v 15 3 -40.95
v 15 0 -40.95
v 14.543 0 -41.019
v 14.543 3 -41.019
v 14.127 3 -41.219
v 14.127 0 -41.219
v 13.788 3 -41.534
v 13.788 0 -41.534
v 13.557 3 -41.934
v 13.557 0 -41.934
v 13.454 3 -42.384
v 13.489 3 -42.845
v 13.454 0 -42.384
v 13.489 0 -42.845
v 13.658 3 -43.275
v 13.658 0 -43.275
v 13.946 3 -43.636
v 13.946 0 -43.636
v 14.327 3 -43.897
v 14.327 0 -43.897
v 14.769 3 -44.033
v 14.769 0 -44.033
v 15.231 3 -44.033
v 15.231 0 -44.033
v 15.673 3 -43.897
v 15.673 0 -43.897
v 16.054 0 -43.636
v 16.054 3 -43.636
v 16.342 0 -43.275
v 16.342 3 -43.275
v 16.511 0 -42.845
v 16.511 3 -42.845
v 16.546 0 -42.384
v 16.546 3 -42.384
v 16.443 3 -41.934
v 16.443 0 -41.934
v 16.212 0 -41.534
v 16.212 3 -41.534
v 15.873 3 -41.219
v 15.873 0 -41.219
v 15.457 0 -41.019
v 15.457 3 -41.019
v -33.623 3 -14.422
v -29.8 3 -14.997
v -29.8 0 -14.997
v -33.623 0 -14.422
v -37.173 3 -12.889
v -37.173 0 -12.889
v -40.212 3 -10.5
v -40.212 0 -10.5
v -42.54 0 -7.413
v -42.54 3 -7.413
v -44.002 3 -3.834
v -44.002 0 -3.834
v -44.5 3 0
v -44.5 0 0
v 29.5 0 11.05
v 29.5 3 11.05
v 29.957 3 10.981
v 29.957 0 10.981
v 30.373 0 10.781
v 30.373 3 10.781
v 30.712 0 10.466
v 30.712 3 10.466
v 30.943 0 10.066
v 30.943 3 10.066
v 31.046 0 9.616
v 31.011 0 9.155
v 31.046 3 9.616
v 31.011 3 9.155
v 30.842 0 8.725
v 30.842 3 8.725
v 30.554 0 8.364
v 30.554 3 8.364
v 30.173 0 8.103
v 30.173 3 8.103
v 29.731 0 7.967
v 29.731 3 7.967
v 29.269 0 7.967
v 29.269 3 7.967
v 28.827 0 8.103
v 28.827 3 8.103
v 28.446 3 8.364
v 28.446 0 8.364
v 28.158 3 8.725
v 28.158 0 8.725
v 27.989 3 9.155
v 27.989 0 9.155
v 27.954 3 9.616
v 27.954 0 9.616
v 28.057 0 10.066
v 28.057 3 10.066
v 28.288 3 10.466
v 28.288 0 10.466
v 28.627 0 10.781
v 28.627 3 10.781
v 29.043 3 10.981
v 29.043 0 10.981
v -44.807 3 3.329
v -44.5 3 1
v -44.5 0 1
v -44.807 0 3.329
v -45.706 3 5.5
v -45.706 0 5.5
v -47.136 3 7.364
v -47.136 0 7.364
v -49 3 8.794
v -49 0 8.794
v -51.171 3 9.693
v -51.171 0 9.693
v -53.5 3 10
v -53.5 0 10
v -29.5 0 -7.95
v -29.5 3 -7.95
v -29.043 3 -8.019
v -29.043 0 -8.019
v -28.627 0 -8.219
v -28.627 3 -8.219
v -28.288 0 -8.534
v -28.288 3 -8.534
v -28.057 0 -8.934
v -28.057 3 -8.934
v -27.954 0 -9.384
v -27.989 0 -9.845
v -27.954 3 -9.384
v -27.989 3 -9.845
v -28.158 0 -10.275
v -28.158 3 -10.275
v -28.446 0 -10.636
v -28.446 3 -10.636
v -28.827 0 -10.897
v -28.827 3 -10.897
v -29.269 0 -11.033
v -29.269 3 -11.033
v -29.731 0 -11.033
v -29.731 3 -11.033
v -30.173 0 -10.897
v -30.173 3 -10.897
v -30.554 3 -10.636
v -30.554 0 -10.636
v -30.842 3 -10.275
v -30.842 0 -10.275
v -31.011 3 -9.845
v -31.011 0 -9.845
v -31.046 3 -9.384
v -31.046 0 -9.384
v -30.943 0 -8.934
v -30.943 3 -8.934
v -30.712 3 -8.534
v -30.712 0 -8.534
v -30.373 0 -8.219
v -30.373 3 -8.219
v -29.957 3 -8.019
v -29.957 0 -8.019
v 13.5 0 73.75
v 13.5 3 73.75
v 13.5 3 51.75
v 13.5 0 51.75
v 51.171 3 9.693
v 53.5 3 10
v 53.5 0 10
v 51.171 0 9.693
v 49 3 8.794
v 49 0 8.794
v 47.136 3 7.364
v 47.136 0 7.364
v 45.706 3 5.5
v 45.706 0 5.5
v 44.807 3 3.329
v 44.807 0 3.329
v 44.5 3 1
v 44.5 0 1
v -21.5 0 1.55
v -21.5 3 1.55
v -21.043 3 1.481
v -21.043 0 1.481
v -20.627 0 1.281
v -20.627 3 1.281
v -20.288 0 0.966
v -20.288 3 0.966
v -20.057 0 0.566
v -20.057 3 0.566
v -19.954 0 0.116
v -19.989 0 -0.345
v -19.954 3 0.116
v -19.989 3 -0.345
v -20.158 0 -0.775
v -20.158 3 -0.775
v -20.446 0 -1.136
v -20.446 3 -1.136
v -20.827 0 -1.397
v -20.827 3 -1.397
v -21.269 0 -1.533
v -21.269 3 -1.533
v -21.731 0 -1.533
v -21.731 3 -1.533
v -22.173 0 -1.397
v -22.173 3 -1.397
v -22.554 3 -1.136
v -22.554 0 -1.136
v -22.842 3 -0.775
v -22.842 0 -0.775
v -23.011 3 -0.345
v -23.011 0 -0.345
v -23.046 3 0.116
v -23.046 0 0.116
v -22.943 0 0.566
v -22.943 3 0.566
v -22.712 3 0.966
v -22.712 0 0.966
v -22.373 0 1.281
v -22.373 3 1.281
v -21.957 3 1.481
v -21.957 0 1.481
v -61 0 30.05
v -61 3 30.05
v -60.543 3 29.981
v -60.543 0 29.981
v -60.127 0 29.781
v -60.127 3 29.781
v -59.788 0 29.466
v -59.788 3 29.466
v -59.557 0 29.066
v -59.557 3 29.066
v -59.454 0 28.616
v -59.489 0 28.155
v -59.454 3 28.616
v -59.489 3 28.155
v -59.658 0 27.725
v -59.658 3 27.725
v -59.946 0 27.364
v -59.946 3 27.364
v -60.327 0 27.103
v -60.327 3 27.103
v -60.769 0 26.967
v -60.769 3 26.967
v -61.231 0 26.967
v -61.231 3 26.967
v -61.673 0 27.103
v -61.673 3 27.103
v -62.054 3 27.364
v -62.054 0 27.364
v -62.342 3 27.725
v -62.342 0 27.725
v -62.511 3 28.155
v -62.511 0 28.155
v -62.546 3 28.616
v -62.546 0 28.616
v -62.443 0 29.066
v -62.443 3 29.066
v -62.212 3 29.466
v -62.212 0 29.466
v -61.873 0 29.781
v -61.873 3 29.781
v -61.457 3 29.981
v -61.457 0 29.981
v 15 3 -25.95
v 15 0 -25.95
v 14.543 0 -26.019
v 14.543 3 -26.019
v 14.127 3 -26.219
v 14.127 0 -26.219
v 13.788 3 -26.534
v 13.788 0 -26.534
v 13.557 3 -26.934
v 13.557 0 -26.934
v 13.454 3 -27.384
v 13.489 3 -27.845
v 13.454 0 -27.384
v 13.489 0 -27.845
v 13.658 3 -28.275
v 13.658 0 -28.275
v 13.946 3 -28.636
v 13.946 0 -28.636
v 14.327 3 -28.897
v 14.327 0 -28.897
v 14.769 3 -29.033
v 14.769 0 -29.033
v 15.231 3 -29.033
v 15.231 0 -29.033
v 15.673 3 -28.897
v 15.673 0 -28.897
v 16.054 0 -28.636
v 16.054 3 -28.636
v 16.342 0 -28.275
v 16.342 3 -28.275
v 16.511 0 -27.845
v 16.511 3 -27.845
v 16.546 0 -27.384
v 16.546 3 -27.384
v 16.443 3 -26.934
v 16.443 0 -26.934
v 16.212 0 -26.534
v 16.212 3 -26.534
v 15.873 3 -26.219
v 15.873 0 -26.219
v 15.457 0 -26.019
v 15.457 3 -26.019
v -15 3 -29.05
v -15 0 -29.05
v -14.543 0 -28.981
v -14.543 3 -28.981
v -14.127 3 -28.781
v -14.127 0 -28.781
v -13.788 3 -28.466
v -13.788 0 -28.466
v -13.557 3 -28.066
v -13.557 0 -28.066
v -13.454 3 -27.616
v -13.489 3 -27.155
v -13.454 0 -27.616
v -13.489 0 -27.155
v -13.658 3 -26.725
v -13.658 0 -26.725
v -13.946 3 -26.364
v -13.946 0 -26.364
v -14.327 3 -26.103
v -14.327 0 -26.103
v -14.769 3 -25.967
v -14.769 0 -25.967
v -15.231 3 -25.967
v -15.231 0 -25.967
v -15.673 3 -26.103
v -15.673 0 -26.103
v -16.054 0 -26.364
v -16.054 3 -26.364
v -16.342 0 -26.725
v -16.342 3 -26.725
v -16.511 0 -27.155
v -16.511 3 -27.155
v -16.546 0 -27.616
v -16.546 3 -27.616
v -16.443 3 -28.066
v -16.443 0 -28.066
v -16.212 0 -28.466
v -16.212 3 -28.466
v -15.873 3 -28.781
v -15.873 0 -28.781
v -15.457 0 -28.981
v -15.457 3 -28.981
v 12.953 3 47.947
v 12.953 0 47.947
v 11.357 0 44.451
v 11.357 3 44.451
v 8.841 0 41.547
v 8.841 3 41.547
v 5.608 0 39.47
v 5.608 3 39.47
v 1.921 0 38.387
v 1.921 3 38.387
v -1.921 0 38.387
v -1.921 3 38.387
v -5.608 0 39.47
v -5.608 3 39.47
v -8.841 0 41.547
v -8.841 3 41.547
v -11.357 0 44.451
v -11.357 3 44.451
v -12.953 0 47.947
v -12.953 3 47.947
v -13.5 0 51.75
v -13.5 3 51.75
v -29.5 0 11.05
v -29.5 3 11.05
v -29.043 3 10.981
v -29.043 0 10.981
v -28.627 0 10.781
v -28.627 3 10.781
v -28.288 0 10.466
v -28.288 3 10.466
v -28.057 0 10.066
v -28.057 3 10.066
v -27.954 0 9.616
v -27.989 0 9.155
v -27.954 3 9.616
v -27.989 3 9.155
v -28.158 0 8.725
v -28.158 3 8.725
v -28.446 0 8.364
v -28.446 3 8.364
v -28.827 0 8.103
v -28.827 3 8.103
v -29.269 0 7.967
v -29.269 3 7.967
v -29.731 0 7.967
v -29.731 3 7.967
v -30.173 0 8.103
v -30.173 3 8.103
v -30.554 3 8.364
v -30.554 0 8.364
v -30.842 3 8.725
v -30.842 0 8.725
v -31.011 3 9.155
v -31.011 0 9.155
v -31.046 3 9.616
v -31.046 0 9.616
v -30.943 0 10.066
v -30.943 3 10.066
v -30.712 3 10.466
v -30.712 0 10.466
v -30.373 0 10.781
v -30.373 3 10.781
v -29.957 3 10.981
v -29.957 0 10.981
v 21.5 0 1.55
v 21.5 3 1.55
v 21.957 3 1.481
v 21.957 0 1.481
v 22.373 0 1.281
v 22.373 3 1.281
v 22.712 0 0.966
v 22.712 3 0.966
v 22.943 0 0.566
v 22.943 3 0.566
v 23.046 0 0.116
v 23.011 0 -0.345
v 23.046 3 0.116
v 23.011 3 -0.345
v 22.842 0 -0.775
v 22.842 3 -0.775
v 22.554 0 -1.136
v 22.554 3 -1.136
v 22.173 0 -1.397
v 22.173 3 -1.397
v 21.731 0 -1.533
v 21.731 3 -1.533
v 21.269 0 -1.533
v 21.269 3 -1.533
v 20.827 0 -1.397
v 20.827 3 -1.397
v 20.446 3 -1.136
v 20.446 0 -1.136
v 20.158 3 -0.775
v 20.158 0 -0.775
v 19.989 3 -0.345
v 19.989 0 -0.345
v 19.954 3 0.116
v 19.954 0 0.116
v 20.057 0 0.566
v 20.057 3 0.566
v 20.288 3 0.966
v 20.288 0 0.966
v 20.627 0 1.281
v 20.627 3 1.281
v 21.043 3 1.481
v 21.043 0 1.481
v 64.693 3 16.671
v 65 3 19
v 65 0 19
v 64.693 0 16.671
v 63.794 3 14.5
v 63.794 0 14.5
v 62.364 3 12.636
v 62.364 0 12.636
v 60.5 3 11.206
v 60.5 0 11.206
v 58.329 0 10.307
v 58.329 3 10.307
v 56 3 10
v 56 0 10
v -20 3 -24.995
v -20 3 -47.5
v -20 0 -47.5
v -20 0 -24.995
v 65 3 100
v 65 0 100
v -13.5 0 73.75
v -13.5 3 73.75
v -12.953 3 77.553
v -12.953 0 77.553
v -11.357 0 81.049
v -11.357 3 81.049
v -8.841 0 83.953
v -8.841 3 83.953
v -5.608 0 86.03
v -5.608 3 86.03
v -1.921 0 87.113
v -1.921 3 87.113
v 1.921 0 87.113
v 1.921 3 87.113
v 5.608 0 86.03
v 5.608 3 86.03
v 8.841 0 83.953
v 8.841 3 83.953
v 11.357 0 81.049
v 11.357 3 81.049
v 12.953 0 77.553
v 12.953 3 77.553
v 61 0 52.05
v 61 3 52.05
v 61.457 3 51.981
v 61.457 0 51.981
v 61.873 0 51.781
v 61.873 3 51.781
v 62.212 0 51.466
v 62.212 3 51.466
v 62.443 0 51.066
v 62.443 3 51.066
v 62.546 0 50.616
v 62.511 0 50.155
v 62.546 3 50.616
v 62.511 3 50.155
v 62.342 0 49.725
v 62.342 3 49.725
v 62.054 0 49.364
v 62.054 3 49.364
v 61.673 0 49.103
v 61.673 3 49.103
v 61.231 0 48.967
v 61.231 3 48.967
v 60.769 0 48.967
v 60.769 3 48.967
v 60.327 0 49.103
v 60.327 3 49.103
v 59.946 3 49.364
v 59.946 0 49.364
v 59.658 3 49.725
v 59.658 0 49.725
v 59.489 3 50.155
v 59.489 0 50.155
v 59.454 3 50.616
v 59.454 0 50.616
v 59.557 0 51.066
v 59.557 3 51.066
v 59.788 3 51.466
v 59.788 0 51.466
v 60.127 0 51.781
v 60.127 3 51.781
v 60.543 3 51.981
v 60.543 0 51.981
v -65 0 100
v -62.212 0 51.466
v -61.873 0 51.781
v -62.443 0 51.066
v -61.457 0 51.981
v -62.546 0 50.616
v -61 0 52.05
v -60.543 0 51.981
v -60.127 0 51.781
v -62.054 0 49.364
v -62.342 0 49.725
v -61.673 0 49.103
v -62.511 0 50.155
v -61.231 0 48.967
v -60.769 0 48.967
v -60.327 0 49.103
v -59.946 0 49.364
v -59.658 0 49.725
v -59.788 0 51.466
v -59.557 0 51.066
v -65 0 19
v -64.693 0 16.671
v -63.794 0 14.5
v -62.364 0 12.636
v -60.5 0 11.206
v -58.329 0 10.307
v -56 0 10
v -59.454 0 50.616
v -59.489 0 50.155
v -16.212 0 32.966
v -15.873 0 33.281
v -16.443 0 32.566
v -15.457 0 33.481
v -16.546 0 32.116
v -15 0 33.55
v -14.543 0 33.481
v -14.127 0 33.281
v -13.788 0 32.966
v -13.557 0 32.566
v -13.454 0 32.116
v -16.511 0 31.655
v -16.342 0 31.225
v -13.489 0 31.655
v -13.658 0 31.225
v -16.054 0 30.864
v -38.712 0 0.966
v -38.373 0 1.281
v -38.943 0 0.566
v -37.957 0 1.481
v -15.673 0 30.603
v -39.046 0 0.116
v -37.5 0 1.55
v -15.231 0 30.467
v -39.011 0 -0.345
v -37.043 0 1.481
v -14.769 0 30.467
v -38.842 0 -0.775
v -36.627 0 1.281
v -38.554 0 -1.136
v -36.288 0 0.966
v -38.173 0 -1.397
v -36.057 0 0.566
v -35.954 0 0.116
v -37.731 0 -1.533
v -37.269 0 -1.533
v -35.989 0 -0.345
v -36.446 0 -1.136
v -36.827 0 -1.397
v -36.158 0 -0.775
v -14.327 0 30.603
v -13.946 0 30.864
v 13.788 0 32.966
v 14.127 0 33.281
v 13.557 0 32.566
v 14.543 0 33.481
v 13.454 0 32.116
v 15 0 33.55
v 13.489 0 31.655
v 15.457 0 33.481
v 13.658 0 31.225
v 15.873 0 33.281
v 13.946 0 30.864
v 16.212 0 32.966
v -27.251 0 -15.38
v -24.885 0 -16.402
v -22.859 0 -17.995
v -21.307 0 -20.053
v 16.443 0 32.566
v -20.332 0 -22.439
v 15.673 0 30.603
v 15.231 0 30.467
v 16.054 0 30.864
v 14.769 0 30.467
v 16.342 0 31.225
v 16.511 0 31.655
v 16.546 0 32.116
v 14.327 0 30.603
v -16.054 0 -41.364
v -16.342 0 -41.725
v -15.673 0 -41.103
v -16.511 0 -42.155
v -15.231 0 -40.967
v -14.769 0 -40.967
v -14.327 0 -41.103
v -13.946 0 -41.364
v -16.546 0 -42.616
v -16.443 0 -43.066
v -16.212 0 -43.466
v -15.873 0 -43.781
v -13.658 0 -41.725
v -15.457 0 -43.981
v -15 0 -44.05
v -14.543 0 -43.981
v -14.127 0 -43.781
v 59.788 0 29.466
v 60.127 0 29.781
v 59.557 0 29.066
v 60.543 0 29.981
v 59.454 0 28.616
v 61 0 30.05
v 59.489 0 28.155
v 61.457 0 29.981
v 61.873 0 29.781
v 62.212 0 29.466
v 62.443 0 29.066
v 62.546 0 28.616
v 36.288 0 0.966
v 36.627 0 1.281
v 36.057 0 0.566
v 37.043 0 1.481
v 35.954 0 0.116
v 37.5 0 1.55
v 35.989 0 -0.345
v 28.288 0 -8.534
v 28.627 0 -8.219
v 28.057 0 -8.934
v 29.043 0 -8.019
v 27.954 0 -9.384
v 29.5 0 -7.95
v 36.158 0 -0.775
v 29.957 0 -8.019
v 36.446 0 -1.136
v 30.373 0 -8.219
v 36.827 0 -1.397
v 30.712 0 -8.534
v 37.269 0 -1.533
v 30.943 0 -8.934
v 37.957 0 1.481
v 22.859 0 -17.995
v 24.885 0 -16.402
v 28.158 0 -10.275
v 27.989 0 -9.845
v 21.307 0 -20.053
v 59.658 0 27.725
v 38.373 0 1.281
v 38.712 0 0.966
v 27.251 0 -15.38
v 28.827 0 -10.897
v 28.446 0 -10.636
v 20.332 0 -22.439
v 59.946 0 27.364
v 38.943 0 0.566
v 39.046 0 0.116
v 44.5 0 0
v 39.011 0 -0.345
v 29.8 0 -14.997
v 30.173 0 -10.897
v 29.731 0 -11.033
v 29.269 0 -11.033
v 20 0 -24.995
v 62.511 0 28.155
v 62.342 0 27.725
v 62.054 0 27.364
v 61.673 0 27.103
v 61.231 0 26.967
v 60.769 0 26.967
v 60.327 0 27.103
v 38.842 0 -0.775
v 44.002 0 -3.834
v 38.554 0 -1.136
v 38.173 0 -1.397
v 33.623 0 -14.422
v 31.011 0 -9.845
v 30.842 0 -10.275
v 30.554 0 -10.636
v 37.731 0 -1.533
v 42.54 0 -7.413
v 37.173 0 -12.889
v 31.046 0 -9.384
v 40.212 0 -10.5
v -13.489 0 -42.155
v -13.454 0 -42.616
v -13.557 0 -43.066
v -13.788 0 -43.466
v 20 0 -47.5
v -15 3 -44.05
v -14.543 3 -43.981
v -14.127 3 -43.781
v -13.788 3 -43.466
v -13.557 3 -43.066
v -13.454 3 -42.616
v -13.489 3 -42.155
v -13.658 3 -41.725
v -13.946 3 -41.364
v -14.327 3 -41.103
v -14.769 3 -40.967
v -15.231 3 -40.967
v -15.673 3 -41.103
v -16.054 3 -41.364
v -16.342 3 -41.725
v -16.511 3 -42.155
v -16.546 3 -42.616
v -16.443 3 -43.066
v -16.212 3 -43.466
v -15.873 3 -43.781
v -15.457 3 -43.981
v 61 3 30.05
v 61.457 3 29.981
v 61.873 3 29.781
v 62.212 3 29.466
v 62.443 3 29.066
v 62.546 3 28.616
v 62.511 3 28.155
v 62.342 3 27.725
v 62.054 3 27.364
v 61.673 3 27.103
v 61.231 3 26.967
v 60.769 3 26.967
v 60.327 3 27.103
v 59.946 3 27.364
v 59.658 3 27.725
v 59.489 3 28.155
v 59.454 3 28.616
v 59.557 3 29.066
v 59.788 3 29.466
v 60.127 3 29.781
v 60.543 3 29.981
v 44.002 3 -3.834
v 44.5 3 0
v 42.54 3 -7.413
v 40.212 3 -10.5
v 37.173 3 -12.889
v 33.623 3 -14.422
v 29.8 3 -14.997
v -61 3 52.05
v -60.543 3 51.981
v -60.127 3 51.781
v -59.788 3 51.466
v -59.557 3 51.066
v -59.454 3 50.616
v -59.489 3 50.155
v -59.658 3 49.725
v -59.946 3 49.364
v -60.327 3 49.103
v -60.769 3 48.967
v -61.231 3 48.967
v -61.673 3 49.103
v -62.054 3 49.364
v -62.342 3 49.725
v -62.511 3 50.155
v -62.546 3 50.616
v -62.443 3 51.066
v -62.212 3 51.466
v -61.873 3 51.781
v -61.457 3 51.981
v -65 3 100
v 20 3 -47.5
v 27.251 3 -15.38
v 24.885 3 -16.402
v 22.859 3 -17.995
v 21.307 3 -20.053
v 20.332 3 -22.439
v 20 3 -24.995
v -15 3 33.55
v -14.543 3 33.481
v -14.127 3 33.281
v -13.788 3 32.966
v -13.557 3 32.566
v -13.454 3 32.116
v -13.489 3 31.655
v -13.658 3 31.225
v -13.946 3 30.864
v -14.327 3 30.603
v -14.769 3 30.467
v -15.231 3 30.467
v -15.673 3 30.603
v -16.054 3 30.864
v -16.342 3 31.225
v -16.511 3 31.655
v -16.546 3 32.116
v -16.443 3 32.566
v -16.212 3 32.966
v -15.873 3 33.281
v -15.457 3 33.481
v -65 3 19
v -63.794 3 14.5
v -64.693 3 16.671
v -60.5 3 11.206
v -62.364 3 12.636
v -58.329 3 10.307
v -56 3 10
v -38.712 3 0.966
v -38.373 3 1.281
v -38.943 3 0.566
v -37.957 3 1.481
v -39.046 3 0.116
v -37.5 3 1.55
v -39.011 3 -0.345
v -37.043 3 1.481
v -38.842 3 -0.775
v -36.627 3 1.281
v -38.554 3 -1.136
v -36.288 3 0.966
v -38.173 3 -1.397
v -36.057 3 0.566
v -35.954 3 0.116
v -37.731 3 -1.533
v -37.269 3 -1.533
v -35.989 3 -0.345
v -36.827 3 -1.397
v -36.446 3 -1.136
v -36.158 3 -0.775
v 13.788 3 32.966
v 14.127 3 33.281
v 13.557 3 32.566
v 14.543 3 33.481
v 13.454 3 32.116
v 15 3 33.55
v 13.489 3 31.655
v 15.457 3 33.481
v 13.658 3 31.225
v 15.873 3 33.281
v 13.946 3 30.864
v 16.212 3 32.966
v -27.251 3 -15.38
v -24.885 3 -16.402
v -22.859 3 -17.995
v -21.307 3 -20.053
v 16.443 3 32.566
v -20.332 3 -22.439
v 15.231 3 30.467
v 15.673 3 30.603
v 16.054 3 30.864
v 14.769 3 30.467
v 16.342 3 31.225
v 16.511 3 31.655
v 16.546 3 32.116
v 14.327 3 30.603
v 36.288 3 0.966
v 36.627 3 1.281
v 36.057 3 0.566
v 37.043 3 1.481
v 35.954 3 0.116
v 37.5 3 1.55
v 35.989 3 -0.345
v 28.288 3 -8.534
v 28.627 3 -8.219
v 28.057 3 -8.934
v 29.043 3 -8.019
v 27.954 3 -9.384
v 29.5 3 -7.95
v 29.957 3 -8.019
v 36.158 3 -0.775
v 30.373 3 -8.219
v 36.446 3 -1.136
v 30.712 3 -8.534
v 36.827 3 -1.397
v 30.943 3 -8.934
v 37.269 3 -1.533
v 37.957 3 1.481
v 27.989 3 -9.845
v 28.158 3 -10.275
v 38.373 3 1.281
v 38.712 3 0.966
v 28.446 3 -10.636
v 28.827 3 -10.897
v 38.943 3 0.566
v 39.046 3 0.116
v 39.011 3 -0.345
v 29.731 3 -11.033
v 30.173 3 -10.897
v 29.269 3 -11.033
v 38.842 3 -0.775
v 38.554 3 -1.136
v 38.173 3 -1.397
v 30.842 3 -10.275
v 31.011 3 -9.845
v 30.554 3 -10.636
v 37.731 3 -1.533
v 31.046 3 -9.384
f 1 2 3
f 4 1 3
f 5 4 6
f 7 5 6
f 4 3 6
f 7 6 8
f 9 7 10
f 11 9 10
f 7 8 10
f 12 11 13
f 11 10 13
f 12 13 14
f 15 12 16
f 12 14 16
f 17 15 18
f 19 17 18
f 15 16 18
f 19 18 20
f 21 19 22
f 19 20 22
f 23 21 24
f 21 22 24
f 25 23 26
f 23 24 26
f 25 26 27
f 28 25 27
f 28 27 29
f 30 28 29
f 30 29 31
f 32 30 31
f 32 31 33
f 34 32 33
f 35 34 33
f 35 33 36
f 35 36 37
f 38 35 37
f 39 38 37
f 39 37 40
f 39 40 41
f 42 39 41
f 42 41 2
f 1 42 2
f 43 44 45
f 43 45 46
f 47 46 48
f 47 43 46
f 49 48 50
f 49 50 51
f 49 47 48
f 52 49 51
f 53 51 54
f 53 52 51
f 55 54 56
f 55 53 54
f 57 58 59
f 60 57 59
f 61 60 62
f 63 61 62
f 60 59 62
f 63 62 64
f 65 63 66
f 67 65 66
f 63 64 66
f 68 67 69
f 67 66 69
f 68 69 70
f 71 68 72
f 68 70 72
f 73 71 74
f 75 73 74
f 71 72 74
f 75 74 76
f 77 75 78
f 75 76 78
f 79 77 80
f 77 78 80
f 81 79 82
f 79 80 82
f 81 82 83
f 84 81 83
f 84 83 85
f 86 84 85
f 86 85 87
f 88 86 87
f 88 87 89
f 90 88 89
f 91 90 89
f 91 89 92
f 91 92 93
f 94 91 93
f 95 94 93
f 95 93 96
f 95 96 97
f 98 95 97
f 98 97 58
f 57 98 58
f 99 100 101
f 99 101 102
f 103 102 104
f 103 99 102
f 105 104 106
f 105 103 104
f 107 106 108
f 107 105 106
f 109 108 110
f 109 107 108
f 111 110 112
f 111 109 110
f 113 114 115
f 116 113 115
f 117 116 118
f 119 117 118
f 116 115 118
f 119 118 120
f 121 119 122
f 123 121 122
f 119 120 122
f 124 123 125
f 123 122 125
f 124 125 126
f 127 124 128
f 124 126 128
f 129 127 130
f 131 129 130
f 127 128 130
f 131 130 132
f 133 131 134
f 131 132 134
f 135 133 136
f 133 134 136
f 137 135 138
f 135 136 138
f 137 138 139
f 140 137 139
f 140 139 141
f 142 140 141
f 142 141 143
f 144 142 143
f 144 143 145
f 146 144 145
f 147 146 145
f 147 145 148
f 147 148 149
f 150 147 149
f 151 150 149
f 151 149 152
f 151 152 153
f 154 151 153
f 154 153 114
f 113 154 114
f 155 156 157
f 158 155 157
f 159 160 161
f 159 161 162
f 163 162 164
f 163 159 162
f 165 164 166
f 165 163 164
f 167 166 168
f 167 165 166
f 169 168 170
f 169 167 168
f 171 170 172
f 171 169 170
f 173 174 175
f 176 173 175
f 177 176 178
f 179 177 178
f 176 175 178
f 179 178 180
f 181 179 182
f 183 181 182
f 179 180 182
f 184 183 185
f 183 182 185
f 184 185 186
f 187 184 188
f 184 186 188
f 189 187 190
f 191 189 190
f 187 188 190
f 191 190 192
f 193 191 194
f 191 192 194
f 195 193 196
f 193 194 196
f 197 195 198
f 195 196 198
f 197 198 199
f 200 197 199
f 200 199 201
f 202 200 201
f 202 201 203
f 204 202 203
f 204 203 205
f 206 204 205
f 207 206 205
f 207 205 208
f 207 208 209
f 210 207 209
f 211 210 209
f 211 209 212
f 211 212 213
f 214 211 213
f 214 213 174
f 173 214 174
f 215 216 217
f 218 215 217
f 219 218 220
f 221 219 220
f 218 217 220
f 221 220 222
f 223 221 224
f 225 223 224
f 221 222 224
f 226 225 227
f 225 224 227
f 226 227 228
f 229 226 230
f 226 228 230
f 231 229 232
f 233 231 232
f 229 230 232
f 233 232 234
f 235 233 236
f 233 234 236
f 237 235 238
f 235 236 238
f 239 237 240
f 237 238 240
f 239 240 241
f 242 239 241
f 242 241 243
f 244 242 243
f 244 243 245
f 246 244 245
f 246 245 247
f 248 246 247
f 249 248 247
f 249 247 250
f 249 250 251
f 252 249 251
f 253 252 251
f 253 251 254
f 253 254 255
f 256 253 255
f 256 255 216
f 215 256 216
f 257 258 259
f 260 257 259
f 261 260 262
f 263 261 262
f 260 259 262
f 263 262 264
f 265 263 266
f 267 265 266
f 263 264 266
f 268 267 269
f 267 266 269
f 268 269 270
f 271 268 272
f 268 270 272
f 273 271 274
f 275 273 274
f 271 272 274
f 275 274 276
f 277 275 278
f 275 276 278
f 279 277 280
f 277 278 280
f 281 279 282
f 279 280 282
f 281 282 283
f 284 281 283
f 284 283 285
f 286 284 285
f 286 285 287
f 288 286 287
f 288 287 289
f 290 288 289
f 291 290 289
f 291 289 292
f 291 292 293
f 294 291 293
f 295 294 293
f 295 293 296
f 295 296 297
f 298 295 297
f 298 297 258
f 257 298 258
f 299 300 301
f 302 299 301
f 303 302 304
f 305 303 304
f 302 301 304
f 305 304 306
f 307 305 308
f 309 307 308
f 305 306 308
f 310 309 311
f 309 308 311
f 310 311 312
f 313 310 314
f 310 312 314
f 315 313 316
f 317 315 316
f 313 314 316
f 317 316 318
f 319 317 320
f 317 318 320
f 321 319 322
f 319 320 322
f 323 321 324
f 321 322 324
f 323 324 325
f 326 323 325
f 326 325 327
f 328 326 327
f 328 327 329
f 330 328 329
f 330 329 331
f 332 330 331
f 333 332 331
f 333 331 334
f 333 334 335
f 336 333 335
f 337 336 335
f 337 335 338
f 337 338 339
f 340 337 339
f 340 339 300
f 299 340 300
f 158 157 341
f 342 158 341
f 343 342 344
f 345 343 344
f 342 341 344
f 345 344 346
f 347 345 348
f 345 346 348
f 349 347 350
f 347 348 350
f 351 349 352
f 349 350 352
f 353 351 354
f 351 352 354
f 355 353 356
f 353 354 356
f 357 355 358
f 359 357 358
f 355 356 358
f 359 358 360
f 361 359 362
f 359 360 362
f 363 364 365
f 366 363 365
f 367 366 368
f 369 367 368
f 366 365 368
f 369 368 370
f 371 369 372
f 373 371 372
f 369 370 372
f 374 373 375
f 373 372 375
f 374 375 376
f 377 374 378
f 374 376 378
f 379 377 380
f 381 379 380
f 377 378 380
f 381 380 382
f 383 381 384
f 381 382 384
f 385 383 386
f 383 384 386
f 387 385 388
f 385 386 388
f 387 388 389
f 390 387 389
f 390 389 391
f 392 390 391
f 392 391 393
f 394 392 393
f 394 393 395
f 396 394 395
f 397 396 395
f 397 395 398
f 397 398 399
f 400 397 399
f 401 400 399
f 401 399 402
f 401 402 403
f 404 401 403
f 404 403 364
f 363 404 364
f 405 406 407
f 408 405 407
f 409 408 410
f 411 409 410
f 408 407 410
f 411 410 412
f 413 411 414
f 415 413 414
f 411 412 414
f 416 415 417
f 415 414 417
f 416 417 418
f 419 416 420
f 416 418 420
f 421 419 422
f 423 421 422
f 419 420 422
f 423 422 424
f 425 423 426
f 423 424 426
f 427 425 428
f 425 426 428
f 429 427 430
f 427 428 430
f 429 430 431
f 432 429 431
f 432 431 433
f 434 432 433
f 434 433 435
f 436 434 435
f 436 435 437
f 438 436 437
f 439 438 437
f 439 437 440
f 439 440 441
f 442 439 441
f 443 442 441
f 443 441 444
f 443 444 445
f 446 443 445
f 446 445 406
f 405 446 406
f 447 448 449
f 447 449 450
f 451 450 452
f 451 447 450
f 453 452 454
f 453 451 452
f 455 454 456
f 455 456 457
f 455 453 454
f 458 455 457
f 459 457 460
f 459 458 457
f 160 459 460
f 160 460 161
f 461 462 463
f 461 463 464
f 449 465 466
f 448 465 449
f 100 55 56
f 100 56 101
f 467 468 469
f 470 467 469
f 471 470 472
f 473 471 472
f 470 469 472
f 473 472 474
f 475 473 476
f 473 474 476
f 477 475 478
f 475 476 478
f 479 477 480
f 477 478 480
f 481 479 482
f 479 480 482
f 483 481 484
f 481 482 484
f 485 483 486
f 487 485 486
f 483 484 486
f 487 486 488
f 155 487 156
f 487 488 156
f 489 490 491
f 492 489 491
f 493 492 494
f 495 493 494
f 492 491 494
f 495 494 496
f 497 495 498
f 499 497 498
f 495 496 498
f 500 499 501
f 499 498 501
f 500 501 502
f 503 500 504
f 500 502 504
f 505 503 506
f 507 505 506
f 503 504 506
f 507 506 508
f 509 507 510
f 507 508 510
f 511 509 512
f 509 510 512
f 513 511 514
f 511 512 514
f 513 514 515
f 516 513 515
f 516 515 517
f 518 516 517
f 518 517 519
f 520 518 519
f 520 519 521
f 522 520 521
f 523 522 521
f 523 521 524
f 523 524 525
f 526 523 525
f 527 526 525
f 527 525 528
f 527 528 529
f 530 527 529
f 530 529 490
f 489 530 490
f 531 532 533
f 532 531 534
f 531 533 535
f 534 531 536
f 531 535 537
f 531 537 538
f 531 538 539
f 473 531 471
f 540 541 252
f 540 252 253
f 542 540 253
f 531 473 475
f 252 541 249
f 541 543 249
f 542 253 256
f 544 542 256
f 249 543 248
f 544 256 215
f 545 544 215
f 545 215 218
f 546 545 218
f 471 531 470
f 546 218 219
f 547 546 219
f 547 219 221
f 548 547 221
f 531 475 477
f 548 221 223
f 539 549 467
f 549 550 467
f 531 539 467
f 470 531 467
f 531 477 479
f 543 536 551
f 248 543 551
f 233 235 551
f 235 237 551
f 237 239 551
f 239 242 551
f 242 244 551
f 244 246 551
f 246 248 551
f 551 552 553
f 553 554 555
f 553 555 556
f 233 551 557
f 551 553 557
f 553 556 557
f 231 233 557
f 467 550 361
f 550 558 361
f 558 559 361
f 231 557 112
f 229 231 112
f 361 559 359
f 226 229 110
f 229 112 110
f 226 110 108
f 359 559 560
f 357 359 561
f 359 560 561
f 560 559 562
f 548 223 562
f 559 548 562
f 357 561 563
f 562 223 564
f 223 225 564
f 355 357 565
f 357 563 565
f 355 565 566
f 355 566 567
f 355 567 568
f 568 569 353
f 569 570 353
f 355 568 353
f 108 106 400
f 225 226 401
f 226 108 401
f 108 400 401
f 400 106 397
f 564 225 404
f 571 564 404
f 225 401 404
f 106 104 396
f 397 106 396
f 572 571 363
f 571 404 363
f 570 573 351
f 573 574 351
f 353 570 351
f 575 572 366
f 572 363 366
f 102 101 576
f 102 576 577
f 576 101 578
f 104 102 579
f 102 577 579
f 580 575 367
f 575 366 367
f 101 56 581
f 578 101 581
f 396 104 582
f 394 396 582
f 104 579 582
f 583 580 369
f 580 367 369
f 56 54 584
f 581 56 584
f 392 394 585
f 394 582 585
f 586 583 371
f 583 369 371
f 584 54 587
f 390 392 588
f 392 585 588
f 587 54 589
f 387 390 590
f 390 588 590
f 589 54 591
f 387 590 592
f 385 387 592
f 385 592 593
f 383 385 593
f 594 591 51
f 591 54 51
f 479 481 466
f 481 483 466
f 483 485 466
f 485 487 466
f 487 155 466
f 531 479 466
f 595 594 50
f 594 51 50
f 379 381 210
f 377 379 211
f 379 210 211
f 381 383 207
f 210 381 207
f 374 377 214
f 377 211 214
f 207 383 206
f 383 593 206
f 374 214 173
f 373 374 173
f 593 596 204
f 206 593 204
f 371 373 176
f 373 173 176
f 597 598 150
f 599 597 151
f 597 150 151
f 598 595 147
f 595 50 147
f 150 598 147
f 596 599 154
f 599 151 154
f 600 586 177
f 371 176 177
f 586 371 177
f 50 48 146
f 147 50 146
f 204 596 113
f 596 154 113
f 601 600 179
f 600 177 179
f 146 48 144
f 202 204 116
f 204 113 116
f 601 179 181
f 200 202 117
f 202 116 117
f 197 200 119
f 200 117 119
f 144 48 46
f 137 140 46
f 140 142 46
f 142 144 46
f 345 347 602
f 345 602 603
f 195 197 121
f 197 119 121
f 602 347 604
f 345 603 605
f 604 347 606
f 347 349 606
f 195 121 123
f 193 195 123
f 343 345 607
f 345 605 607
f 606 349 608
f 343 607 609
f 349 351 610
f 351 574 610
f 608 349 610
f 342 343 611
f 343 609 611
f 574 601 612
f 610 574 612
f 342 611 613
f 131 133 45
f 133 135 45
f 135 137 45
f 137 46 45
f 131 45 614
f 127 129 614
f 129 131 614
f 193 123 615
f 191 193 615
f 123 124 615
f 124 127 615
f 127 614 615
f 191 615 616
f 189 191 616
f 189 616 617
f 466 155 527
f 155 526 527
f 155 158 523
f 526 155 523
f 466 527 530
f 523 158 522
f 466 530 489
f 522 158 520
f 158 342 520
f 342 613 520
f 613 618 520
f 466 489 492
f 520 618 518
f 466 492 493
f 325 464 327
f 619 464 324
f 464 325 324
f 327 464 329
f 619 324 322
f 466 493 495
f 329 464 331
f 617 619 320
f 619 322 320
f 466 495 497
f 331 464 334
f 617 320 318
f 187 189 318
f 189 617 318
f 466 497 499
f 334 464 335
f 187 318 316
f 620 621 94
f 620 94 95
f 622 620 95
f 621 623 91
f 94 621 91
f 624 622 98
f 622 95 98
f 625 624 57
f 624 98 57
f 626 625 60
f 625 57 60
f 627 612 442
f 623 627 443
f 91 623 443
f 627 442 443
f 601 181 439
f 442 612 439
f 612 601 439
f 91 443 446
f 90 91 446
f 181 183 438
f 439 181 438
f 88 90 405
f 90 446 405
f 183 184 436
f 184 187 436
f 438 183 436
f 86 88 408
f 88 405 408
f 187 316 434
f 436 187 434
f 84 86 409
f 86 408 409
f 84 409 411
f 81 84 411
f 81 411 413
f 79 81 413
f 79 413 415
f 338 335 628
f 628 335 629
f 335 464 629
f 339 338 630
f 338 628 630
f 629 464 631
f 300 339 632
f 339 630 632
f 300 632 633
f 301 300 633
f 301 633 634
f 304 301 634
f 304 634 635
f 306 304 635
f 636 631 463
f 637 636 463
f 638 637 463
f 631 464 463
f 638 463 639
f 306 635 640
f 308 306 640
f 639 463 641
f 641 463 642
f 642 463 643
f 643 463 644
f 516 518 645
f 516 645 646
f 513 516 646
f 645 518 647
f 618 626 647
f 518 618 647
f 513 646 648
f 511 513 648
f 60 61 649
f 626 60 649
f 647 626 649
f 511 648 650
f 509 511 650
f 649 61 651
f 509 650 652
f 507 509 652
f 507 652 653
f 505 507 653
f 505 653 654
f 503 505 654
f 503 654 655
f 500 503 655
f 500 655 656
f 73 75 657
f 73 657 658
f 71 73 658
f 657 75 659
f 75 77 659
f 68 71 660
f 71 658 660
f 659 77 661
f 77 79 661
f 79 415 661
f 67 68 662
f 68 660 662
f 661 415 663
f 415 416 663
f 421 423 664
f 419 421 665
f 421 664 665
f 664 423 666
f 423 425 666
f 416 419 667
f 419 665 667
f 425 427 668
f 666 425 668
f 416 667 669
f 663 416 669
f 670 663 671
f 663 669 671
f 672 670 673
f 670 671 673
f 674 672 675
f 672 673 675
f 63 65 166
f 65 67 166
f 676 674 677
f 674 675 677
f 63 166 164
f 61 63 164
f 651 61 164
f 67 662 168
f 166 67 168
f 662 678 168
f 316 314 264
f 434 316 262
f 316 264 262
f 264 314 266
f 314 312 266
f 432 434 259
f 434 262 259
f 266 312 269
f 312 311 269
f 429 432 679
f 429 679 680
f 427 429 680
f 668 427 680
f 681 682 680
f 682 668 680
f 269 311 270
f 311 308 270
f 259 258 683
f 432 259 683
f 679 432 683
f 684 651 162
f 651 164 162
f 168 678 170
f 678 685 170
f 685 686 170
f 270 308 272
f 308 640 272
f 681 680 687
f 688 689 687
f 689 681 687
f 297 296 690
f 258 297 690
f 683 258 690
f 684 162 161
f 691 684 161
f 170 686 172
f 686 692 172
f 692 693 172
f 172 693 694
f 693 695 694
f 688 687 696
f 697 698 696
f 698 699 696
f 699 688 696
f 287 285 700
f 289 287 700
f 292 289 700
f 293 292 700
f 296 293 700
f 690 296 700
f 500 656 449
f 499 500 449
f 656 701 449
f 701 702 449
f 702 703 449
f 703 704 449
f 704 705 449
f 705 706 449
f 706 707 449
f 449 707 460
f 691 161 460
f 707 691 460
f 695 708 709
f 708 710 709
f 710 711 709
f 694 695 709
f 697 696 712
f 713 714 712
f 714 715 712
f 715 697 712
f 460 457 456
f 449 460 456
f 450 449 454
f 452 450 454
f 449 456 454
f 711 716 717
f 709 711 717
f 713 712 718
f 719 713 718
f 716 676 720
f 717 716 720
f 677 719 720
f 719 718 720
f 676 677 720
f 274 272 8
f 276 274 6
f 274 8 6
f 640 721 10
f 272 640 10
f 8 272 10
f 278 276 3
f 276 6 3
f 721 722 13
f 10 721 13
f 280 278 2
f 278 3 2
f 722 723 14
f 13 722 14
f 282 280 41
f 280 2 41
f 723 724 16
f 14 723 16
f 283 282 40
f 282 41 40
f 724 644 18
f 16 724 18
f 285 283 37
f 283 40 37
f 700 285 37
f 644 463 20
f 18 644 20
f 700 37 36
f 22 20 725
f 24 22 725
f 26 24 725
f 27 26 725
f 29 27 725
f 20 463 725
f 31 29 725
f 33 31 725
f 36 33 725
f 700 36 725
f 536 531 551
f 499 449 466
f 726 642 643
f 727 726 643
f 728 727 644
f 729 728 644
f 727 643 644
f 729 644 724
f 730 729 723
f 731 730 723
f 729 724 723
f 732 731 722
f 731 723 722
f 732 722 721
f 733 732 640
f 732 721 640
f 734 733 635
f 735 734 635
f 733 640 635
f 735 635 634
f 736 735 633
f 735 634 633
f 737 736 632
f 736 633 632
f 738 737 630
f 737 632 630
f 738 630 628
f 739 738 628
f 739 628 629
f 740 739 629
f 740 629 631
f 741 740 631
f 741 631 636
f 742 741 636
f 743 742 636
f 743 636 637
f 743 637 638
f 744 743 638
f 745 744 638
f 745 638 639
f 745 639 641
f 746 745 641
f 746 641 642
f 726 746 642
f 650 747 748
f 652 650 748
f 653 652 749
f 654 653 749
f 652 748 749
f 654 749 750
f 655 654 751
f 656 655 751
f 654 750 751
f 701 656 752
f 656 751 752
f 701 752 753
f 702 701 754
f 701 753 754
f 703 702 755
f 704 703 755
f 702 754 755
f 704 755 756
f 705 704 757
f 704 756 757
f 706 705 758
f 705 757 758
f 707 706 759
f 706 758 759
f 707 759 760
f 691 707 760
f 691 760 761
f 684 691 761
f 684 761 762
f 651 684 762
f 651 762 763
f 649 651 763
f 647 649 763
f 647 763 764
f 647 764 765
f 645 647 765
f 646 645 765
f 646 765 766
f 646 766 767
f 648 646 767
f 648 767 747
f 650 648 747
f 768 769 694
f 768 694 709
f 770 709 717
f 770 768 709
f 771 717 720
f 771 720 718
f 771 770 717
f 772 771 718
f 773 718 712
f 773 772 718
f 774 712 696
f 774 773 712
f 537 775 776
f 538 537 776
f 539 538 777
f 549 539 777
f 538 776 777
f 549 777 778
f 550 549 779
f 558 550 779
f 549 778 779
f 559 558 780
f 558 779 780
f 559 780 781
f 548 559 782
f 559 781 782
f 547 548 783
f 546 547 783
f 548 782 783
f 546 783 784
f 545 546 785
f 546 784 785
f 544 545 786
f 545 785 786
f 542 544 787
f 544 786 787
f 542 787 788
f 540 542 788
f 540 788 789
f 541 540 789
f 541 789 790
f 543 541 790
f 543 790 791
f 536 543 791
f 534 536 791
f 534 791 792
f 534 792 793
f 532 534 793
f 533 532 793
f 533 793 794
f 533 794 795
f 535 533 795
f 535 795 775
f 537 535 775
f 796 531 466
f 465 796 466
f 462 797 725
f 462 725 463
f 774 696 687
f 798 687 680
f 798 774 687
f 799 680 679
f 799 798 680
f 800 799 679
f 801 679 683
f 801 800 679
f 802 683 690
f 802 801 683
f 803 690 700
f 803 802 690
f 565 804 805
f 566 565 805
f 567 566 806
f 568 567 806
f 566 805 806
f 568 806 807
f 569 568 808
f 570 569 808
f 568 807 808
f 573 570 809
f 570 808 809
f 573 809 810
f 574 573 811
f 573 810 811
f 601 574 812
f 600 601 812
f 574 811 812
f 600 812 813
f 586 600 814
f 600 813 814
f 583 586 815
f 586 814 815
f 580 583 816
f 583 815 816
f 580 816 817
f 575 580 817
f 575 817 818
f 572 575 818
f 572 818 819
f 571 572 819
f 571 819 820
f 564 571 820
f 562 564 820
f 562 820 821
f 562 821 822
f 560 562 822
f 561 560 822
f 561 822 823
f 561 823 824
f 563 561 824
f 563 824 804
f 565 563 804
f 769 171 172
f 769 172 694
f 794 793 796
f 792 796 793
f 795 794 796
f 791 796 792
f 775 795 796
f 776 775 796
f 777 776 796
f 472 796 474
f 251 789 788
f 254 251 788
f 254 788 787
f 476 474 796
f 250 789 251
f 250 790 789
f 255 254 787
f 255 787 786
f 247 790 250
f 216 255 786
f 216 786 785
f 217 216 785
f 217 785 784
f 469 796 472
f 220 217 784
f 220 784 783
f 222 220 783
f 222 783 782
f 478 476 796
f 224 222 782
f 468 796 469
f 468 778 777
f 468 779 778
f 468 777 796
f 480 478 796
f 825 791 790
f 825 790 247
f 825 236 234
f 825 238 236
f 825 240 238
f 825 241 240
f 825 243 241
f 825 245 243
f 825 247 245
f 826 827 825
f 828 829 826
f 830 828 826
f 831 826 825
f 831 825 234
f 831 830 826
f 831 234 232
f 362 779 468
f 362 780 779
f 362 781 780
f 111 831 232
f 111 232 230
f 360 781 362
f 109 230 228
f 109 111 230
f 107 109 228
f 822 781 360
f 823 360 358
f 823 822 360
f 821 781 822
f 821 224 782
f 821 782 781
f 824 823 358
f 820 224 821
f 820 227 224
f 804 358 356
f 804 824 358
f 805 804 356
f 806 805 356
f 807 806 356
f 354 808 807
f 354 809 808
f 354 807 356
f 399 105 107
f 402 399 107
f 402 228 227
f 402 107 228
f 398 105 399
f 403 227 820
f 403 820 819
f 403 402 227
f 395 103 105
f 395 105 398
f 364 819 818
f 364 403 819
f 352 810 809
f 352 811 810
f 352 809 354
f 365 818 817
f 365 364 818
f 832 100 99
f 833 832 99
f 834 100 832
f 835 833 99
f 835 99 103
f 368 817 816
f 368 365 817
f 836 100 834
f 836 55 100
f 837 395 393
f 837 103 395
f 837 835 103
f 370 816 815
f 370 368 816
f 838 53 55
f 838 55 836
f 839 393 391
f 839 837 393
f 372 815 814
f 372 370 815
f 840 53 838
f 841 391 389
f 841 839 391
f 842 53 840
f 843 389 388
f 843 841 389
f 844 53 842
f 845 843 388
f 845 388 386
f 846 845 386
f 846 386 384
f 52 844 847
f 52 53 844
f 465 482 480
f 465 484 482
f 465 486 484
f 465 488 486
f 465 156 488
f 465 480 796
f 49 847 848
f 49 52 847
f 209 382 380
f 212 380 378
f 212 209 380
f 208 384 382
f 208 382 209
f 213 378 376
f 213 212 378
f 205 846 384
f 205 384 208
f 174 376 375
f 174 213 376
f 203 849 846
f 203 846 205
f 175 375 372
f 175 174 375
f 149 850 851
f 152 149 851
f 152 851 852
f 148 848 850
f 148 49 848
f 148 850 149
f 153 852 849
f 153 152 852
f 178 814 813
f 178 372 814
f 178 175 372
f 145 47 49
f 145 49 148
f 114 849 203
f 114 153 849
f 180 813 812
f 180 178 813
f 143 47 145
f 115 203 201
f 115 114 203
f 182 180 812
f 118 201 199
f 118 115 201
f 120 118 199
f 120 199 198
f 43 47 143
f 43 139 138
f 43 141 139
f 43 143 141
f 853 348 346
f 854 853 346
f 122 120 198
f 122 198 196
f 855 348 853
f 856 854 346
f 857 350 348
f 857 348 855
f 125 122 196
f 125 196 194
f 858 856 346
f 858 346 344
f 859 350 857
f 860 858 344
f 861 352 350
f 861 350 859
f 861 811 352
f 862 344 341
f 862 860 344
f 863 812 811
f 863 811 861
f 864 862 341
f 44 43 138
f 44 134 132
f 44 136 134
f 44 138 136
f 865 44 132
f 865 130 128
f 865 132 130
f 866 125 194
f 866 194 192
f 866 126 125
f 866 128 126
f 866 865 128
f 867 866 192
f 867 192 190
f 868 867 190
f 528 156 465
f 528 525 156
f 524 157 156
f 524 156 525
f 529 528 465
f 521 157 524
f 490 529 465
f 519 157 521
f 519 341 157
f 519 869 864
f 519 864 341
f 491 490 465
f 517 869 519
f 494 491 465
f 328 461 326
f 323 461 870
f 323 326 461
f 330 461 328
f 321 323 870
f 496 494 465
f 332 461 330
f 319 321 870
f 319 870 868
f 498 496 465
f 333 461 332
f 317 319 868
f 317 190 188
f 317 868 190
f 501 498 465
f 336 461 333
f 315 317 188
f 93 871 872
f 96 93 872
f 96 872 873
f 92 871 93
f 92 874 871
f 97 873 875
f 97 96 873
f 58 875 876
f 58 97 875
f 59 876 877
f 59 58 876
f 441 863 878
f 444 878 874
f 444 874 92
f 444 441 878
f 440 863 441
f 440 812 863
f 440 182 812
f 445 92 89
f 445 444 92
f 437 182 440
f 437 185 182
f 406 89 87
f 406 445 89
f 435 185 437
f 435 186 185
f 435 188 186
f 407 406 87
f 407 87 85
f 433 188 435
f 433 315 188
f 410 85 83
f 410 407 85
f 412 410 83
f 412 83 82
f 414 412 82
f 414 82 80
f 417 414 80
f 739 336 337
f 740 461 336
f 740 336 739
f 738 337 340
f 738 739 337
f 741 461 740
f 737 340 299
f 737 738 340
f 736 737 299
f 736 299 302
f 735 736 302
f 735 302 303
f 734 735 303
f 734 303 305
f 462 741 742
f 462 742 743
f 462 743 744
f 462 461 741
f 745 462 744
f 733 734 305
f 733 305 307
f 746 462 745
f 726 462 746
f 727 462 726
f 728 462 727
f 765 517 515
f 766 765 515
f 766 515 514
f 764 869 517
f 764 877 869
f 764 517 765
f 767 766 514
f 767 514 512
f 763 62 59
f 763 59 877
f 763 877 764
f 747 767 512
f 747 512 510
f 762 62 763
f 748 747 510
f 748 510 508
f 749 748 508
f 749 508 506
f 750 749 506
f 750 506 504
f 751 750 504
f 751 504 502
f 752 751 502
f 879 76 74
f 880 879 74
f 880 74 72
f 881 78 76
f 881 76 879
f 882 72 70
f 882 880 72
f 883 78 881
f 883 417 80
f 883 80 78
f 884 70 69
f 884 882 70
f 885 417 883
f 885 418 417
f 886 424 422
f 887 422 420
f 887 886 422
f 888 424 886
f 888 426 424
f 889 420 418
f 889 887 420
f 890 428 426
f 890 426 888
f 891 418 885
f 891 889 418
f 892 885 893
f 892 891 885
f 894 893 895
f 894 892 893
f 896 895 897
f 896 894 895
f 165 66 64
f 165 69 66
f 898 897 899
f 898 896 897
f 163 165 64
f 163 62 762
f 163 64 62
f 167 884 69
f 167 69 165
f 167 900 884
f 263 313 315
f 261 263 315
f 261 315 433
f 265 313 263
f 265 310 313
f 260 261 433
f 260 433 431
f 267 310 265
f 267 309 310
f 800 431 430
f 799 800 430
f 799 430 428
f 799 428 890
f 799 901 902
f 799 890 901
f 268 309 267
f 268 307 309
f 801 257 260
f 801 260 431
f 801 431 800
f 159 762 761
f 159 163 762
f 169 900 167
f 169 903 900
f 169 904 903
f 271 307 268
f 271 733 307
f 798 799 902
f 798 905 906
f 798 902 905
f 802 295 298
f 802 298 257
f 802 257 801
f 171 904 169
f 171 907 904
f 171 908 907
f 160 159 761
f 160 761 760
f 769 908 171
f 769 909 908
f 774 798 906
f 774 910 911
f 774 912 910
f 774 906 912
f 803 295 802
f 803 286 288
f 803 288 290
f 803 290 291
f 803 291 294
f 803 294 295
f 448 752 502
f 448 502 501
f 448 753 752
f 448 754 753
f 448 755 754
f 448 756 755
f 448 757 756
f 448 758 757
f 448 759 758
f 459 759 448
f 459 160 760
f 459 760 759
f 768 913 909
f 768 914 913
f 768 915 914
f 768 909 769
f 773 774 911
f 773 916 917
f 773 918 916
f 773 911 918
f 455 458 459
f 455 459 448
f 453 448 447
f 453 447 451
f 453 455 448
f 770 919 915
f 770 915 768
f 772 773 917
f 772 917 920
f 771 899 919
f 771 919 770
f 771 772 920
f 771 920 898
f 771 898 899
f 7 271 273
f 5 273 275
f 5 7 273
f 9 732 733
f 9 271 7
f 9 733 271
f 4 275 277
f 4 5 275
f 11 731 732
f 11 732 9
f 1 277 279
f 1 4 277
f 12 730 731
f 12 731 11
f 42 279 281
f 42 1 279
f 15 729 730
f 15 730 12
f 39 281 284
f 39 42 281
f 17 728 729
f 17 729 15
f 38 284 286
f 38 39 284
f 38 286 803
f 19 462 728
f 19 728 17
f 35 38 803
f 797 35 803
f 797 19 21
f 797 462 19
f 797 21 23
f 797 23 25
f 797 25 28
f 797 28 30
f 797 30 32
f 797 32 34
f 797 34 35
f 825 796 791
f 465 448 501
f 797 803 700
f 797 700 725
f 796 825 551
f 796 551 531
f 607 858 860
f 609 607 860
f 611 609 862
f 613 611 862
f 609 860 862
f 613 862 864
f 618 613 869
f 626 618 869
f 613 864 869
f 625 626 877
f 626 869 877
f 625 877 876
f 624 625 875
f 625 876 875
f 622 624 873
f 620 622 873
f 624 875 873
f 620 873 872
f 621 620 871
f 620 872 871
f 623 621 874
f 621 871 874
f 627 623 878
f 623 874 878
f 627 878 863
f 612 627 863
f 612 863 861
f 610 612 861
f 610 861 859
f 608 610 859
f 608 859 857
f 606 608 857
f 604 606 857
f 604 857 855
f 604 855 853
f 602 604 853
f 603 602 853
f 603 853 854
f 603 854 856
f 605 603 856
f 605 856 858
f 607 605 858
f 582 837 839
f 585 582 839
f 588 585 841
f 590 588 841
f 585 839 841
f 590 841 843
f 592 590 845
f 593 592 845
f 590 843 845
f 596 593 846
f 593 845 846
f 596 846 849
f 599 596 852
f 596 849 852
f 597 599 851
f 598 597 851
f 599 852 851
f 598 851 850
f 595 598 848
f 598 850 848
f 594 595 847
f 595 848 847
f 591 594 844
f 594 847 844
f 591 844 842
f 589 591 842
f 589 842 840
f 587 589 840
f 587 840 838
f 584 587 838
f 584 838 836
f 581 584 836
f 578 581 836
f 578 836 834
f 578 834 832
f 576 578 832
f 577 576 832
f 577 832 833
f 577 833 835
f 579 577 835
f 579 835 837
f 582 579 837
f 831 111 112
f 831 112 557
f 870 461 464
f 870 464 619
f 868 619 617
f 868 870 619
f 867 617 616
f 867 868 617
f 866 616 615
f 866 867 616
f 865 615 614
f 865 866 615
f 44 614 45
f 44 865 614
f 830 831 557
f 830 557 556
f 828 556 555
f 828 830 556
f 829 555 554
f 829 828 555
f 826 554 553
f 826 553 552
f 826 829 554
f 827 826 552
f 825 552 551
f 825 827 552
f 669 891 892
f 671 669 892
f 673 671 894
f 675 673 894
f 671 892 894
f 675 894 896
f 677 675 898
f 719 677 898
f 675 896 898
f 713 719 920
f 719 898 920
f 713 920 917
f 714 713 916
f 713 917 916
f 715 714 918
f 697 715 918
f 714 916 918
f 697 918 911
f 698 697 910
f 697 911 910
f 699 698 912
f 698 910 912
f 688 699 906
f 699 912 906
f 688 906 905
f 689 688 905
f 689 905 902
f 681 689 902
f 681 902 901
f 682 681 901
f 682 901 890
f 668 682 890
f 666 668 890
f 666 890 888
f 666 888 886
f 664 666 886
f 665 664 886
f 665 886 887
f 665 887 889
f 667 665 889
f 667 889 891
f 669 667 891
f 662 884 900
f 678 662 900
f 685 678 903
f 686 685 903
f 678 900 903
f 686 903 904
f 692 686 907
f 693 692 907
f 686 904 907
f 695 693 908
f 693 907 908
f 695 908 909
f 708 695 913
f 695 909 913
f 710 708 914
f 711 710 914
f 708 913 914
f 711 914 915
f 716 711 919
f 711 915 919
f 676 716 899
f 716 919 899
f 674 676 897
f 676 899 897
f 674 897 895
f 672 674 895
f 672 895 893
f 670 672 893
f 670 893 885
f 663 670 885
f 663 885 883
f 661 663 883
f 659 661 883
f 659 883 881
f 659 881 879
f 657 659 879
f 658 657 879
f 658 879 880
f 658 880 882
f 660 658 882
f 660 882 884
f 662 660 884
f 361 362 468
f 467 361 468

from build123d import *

# Parameters (mm, degrees)
SKETCH_1_W              = 200
SKETCH_1_H              = 200
EXTRUDE_1_DEPTH         = 3
SKETCH_2_R              = 1.55
CUT_EXTRUDE_2_DEPTH     = 10
CUT_EXTRUDE_3_DEPTH     = 10
SKETCH_6_R              = 1.55
CUT_EXTRUDE_3_1_1_DEPTH = 10
SKETCH_7_R              = 1.55
CUT_EXTRUDE_3_1_2_DEPTH = 120.306328416
CUT_EXTRUDE_21_DEPTH    = 10


with BuildPart() as part:
    # 草图1 → 凸台-拉伸1 (new body)
    with BuildSketch(Plane(origin=(0, 0, 0), x_dir=(1, 0, 0), z_dir=(0, 1, 0))):
        Rectangle(SKETCH_1_W, SKETCH_1_H)
    extrude(amount=EXTRUDE_1_DEPTH)

    # 草图2 → 切除-拉伸2 (cut)
    with BuildSketch(Plane(origin=(0, 3, 0), x_dir=(1, 0, 0), z_dir=(0, 1, 0))):
        with Locations(Location((29.5, 9.5, 0), (0, 0, 270))):
            Circle(SKETCH_2_R)
        with Locations(Location((21.5, 0, 0), (0, 0, 270))):
            Circle(SKETCH_2_R)
        with Locations(Location((29.5, -9.5, 0), (0, 0, 270))):
            Circle(SKETCH_2_R)
        with Locations(Location((37.5, 0, 0), (0, 0, 270))):
            Circle(SKETCH_2_R)
        with Locations(Location((-29.5, -9.5, 0), (0, 0, 270))):
            Circle(SKETCH_2_R)
        with Locations(Location((-37.5, 0, 0), (0, 0, 270))):
            Circle(SKETCH_2_R)
        with Locations(Location((-21.5, 0, 0), (0, 0, 270))):
            Circle(SKETCH_2_R)
        with Locations(Location((-29.5, 9.5, 0), (0, 0, 270))):
            Circle(SKETCH_2_R)
        with Locations(Location((-15, -32, 0), (0, 0, 270))):
            Circle(SKETCH_2_R)
        with Locations(Location((15, -32, 0), (0, 0, 270))):
            Circle(SKETCH_2_R)
    extrude(amount=-CUT_EXTRUDE_2_DEPTH, mode=Mode.SUBTRACT)

    # 草图5 → 切除-拉伸3 (cut)
    with BuildSketch(Plane(origin=(0, 3, 0), x_dir=(1, 0, 0), z_dir=(0, 1, 0))):
        with BuildLine():
            Line((-65, -100), (-189.497959863, -100))
            Line((-189.497959863, -100), (-189.497959863, 163.072140164))
            Line((-189.497959863, 163.072140164), (202.300249071, 163.072140164))
            Line((202.300249071, 163.072140164), (202.300249071, -100))
            Line((202.300249071, -100), (65, -100))
            Line((65, -100), (65, -19))
            ThreePointArc((65, -19), (62.363961031, -12.636038969), (56, -10))
            Line((56, -10), (53.5, -10))
            ThreePointArc((53.5, -10), (47.136038969, -7.363961031), (44.5, -1))
            Line((44.5, -1), (44.5, 0))
            ThreePointArc((44.5, 0), (40.212142643, 10.5), (29.8, 14.9969997))
            ThreePointArc((29.8, 14.9969997), (22.858571571, 17.9949995), (20, 24.9949995))
            Line((20, 24.9949995), (20, 47.5))
            Line((20, 47.5), (0, 47.5))
            Line((0, 47.5), (-20, 47.5))
            Line((-20, 47.5), (-20, 24.9949995))
            ThreePointArc((-20, 24.9949995), (-22.858571571, 17.9949995), (-29.8, 14.9969997))
            ThreePointArc((-29.8, 14.9969997), (-40.212142643, 10.5), (-44.5, 0))
            Line((-44.5, 0), (-44.5, -1))
            ThreePointArc((-44.5, -1), (-47.136038969, -7.363961031), (-53.5, -10))
            Line((-53.5, -10), (-56, -10))
            ThreePointArc((-56, -10), (-62.363961031, -12.636038969), (-65, -19))
            Line((-65, -19), (-65, -100))
        make_face()
    extrude(amount=-CUT_EXTRUDE_3_DEPTH, mode=Mode.SUBTRACT)

    # 草图6 → φ3.1通孔1 (cut)
    with BuildSketch(Plane.XZ):
        with Locations(Location((-15, -42.5, 0), (0, 0, 270))):
            Circle(SKETCH_6_R)
        with Locations(Location((-15, -27.5, 0), (0, 0, 270))):
            Circle(SKETCH_6_R)
        with Locations(Location((15, -27.5, 0), (0, 0, 90))):
            Circle(SKETCH_6_R)
        with Locations(Location((15, -42.5, 0), (0, 0, 90))):
            Circle(SKETCH_6_R)
    extrude(amount=-CUT_EXTRUDE_3_1_1_DEPTH, mode=Mode.SUBTRACT)

    # 草图7 → φ3.1通孔2 (cut, through all)
    with BuildSketch(Plane(origin=(0, 3, 0), x_dir=(1, 0, 0), z_dir=(0, 1, 0))):
        with Locations(Location((-61, -28.5, 0), (0, 0, 270))):
            Circle(SKETCH_7_R)
        with Locations(Location((-61, -50.5, 0), (0, 0, 270))):
            Circle(SKETCH_7_R)
        with Locations(Location((61, -28.5, 0), (0, 0, 270))):
            Circle(SKETCH_7_R)
        with Locations(Location((61, -50.5, 0), (0, 0, 270))):
            Circle(SKETCH_7_R)
    extrude(amount=-CUT_EXTRUDE_3_1_2_DEPTH, mode=Mode.SUBTRACT)

    # 草图9 → φ21拨单电机孔 (cut)
    with BuildSketch(Plane(origin=(0, 3, 0), x_dir=(1, 0, 0), z_dir=(0, 1, 0))):
        with BuildLine():
            Line((-13.5, -51.75), (-13.5, -73.75))
            ThreePointArc((-13.5, -73.75), (0, -87.25), (13.5, -73.75))
            Line((13.5, -73.75), (13.5, -51.75))
            ThreePointArc((13.5, -51.75), (0, -38.25), (-13.5, -51.75))
        make_face()
    extrude(amount=-CUT_EXTRUDE_21_DEPTH, mode=Mode.SUBTRACT)


solid = part.part
